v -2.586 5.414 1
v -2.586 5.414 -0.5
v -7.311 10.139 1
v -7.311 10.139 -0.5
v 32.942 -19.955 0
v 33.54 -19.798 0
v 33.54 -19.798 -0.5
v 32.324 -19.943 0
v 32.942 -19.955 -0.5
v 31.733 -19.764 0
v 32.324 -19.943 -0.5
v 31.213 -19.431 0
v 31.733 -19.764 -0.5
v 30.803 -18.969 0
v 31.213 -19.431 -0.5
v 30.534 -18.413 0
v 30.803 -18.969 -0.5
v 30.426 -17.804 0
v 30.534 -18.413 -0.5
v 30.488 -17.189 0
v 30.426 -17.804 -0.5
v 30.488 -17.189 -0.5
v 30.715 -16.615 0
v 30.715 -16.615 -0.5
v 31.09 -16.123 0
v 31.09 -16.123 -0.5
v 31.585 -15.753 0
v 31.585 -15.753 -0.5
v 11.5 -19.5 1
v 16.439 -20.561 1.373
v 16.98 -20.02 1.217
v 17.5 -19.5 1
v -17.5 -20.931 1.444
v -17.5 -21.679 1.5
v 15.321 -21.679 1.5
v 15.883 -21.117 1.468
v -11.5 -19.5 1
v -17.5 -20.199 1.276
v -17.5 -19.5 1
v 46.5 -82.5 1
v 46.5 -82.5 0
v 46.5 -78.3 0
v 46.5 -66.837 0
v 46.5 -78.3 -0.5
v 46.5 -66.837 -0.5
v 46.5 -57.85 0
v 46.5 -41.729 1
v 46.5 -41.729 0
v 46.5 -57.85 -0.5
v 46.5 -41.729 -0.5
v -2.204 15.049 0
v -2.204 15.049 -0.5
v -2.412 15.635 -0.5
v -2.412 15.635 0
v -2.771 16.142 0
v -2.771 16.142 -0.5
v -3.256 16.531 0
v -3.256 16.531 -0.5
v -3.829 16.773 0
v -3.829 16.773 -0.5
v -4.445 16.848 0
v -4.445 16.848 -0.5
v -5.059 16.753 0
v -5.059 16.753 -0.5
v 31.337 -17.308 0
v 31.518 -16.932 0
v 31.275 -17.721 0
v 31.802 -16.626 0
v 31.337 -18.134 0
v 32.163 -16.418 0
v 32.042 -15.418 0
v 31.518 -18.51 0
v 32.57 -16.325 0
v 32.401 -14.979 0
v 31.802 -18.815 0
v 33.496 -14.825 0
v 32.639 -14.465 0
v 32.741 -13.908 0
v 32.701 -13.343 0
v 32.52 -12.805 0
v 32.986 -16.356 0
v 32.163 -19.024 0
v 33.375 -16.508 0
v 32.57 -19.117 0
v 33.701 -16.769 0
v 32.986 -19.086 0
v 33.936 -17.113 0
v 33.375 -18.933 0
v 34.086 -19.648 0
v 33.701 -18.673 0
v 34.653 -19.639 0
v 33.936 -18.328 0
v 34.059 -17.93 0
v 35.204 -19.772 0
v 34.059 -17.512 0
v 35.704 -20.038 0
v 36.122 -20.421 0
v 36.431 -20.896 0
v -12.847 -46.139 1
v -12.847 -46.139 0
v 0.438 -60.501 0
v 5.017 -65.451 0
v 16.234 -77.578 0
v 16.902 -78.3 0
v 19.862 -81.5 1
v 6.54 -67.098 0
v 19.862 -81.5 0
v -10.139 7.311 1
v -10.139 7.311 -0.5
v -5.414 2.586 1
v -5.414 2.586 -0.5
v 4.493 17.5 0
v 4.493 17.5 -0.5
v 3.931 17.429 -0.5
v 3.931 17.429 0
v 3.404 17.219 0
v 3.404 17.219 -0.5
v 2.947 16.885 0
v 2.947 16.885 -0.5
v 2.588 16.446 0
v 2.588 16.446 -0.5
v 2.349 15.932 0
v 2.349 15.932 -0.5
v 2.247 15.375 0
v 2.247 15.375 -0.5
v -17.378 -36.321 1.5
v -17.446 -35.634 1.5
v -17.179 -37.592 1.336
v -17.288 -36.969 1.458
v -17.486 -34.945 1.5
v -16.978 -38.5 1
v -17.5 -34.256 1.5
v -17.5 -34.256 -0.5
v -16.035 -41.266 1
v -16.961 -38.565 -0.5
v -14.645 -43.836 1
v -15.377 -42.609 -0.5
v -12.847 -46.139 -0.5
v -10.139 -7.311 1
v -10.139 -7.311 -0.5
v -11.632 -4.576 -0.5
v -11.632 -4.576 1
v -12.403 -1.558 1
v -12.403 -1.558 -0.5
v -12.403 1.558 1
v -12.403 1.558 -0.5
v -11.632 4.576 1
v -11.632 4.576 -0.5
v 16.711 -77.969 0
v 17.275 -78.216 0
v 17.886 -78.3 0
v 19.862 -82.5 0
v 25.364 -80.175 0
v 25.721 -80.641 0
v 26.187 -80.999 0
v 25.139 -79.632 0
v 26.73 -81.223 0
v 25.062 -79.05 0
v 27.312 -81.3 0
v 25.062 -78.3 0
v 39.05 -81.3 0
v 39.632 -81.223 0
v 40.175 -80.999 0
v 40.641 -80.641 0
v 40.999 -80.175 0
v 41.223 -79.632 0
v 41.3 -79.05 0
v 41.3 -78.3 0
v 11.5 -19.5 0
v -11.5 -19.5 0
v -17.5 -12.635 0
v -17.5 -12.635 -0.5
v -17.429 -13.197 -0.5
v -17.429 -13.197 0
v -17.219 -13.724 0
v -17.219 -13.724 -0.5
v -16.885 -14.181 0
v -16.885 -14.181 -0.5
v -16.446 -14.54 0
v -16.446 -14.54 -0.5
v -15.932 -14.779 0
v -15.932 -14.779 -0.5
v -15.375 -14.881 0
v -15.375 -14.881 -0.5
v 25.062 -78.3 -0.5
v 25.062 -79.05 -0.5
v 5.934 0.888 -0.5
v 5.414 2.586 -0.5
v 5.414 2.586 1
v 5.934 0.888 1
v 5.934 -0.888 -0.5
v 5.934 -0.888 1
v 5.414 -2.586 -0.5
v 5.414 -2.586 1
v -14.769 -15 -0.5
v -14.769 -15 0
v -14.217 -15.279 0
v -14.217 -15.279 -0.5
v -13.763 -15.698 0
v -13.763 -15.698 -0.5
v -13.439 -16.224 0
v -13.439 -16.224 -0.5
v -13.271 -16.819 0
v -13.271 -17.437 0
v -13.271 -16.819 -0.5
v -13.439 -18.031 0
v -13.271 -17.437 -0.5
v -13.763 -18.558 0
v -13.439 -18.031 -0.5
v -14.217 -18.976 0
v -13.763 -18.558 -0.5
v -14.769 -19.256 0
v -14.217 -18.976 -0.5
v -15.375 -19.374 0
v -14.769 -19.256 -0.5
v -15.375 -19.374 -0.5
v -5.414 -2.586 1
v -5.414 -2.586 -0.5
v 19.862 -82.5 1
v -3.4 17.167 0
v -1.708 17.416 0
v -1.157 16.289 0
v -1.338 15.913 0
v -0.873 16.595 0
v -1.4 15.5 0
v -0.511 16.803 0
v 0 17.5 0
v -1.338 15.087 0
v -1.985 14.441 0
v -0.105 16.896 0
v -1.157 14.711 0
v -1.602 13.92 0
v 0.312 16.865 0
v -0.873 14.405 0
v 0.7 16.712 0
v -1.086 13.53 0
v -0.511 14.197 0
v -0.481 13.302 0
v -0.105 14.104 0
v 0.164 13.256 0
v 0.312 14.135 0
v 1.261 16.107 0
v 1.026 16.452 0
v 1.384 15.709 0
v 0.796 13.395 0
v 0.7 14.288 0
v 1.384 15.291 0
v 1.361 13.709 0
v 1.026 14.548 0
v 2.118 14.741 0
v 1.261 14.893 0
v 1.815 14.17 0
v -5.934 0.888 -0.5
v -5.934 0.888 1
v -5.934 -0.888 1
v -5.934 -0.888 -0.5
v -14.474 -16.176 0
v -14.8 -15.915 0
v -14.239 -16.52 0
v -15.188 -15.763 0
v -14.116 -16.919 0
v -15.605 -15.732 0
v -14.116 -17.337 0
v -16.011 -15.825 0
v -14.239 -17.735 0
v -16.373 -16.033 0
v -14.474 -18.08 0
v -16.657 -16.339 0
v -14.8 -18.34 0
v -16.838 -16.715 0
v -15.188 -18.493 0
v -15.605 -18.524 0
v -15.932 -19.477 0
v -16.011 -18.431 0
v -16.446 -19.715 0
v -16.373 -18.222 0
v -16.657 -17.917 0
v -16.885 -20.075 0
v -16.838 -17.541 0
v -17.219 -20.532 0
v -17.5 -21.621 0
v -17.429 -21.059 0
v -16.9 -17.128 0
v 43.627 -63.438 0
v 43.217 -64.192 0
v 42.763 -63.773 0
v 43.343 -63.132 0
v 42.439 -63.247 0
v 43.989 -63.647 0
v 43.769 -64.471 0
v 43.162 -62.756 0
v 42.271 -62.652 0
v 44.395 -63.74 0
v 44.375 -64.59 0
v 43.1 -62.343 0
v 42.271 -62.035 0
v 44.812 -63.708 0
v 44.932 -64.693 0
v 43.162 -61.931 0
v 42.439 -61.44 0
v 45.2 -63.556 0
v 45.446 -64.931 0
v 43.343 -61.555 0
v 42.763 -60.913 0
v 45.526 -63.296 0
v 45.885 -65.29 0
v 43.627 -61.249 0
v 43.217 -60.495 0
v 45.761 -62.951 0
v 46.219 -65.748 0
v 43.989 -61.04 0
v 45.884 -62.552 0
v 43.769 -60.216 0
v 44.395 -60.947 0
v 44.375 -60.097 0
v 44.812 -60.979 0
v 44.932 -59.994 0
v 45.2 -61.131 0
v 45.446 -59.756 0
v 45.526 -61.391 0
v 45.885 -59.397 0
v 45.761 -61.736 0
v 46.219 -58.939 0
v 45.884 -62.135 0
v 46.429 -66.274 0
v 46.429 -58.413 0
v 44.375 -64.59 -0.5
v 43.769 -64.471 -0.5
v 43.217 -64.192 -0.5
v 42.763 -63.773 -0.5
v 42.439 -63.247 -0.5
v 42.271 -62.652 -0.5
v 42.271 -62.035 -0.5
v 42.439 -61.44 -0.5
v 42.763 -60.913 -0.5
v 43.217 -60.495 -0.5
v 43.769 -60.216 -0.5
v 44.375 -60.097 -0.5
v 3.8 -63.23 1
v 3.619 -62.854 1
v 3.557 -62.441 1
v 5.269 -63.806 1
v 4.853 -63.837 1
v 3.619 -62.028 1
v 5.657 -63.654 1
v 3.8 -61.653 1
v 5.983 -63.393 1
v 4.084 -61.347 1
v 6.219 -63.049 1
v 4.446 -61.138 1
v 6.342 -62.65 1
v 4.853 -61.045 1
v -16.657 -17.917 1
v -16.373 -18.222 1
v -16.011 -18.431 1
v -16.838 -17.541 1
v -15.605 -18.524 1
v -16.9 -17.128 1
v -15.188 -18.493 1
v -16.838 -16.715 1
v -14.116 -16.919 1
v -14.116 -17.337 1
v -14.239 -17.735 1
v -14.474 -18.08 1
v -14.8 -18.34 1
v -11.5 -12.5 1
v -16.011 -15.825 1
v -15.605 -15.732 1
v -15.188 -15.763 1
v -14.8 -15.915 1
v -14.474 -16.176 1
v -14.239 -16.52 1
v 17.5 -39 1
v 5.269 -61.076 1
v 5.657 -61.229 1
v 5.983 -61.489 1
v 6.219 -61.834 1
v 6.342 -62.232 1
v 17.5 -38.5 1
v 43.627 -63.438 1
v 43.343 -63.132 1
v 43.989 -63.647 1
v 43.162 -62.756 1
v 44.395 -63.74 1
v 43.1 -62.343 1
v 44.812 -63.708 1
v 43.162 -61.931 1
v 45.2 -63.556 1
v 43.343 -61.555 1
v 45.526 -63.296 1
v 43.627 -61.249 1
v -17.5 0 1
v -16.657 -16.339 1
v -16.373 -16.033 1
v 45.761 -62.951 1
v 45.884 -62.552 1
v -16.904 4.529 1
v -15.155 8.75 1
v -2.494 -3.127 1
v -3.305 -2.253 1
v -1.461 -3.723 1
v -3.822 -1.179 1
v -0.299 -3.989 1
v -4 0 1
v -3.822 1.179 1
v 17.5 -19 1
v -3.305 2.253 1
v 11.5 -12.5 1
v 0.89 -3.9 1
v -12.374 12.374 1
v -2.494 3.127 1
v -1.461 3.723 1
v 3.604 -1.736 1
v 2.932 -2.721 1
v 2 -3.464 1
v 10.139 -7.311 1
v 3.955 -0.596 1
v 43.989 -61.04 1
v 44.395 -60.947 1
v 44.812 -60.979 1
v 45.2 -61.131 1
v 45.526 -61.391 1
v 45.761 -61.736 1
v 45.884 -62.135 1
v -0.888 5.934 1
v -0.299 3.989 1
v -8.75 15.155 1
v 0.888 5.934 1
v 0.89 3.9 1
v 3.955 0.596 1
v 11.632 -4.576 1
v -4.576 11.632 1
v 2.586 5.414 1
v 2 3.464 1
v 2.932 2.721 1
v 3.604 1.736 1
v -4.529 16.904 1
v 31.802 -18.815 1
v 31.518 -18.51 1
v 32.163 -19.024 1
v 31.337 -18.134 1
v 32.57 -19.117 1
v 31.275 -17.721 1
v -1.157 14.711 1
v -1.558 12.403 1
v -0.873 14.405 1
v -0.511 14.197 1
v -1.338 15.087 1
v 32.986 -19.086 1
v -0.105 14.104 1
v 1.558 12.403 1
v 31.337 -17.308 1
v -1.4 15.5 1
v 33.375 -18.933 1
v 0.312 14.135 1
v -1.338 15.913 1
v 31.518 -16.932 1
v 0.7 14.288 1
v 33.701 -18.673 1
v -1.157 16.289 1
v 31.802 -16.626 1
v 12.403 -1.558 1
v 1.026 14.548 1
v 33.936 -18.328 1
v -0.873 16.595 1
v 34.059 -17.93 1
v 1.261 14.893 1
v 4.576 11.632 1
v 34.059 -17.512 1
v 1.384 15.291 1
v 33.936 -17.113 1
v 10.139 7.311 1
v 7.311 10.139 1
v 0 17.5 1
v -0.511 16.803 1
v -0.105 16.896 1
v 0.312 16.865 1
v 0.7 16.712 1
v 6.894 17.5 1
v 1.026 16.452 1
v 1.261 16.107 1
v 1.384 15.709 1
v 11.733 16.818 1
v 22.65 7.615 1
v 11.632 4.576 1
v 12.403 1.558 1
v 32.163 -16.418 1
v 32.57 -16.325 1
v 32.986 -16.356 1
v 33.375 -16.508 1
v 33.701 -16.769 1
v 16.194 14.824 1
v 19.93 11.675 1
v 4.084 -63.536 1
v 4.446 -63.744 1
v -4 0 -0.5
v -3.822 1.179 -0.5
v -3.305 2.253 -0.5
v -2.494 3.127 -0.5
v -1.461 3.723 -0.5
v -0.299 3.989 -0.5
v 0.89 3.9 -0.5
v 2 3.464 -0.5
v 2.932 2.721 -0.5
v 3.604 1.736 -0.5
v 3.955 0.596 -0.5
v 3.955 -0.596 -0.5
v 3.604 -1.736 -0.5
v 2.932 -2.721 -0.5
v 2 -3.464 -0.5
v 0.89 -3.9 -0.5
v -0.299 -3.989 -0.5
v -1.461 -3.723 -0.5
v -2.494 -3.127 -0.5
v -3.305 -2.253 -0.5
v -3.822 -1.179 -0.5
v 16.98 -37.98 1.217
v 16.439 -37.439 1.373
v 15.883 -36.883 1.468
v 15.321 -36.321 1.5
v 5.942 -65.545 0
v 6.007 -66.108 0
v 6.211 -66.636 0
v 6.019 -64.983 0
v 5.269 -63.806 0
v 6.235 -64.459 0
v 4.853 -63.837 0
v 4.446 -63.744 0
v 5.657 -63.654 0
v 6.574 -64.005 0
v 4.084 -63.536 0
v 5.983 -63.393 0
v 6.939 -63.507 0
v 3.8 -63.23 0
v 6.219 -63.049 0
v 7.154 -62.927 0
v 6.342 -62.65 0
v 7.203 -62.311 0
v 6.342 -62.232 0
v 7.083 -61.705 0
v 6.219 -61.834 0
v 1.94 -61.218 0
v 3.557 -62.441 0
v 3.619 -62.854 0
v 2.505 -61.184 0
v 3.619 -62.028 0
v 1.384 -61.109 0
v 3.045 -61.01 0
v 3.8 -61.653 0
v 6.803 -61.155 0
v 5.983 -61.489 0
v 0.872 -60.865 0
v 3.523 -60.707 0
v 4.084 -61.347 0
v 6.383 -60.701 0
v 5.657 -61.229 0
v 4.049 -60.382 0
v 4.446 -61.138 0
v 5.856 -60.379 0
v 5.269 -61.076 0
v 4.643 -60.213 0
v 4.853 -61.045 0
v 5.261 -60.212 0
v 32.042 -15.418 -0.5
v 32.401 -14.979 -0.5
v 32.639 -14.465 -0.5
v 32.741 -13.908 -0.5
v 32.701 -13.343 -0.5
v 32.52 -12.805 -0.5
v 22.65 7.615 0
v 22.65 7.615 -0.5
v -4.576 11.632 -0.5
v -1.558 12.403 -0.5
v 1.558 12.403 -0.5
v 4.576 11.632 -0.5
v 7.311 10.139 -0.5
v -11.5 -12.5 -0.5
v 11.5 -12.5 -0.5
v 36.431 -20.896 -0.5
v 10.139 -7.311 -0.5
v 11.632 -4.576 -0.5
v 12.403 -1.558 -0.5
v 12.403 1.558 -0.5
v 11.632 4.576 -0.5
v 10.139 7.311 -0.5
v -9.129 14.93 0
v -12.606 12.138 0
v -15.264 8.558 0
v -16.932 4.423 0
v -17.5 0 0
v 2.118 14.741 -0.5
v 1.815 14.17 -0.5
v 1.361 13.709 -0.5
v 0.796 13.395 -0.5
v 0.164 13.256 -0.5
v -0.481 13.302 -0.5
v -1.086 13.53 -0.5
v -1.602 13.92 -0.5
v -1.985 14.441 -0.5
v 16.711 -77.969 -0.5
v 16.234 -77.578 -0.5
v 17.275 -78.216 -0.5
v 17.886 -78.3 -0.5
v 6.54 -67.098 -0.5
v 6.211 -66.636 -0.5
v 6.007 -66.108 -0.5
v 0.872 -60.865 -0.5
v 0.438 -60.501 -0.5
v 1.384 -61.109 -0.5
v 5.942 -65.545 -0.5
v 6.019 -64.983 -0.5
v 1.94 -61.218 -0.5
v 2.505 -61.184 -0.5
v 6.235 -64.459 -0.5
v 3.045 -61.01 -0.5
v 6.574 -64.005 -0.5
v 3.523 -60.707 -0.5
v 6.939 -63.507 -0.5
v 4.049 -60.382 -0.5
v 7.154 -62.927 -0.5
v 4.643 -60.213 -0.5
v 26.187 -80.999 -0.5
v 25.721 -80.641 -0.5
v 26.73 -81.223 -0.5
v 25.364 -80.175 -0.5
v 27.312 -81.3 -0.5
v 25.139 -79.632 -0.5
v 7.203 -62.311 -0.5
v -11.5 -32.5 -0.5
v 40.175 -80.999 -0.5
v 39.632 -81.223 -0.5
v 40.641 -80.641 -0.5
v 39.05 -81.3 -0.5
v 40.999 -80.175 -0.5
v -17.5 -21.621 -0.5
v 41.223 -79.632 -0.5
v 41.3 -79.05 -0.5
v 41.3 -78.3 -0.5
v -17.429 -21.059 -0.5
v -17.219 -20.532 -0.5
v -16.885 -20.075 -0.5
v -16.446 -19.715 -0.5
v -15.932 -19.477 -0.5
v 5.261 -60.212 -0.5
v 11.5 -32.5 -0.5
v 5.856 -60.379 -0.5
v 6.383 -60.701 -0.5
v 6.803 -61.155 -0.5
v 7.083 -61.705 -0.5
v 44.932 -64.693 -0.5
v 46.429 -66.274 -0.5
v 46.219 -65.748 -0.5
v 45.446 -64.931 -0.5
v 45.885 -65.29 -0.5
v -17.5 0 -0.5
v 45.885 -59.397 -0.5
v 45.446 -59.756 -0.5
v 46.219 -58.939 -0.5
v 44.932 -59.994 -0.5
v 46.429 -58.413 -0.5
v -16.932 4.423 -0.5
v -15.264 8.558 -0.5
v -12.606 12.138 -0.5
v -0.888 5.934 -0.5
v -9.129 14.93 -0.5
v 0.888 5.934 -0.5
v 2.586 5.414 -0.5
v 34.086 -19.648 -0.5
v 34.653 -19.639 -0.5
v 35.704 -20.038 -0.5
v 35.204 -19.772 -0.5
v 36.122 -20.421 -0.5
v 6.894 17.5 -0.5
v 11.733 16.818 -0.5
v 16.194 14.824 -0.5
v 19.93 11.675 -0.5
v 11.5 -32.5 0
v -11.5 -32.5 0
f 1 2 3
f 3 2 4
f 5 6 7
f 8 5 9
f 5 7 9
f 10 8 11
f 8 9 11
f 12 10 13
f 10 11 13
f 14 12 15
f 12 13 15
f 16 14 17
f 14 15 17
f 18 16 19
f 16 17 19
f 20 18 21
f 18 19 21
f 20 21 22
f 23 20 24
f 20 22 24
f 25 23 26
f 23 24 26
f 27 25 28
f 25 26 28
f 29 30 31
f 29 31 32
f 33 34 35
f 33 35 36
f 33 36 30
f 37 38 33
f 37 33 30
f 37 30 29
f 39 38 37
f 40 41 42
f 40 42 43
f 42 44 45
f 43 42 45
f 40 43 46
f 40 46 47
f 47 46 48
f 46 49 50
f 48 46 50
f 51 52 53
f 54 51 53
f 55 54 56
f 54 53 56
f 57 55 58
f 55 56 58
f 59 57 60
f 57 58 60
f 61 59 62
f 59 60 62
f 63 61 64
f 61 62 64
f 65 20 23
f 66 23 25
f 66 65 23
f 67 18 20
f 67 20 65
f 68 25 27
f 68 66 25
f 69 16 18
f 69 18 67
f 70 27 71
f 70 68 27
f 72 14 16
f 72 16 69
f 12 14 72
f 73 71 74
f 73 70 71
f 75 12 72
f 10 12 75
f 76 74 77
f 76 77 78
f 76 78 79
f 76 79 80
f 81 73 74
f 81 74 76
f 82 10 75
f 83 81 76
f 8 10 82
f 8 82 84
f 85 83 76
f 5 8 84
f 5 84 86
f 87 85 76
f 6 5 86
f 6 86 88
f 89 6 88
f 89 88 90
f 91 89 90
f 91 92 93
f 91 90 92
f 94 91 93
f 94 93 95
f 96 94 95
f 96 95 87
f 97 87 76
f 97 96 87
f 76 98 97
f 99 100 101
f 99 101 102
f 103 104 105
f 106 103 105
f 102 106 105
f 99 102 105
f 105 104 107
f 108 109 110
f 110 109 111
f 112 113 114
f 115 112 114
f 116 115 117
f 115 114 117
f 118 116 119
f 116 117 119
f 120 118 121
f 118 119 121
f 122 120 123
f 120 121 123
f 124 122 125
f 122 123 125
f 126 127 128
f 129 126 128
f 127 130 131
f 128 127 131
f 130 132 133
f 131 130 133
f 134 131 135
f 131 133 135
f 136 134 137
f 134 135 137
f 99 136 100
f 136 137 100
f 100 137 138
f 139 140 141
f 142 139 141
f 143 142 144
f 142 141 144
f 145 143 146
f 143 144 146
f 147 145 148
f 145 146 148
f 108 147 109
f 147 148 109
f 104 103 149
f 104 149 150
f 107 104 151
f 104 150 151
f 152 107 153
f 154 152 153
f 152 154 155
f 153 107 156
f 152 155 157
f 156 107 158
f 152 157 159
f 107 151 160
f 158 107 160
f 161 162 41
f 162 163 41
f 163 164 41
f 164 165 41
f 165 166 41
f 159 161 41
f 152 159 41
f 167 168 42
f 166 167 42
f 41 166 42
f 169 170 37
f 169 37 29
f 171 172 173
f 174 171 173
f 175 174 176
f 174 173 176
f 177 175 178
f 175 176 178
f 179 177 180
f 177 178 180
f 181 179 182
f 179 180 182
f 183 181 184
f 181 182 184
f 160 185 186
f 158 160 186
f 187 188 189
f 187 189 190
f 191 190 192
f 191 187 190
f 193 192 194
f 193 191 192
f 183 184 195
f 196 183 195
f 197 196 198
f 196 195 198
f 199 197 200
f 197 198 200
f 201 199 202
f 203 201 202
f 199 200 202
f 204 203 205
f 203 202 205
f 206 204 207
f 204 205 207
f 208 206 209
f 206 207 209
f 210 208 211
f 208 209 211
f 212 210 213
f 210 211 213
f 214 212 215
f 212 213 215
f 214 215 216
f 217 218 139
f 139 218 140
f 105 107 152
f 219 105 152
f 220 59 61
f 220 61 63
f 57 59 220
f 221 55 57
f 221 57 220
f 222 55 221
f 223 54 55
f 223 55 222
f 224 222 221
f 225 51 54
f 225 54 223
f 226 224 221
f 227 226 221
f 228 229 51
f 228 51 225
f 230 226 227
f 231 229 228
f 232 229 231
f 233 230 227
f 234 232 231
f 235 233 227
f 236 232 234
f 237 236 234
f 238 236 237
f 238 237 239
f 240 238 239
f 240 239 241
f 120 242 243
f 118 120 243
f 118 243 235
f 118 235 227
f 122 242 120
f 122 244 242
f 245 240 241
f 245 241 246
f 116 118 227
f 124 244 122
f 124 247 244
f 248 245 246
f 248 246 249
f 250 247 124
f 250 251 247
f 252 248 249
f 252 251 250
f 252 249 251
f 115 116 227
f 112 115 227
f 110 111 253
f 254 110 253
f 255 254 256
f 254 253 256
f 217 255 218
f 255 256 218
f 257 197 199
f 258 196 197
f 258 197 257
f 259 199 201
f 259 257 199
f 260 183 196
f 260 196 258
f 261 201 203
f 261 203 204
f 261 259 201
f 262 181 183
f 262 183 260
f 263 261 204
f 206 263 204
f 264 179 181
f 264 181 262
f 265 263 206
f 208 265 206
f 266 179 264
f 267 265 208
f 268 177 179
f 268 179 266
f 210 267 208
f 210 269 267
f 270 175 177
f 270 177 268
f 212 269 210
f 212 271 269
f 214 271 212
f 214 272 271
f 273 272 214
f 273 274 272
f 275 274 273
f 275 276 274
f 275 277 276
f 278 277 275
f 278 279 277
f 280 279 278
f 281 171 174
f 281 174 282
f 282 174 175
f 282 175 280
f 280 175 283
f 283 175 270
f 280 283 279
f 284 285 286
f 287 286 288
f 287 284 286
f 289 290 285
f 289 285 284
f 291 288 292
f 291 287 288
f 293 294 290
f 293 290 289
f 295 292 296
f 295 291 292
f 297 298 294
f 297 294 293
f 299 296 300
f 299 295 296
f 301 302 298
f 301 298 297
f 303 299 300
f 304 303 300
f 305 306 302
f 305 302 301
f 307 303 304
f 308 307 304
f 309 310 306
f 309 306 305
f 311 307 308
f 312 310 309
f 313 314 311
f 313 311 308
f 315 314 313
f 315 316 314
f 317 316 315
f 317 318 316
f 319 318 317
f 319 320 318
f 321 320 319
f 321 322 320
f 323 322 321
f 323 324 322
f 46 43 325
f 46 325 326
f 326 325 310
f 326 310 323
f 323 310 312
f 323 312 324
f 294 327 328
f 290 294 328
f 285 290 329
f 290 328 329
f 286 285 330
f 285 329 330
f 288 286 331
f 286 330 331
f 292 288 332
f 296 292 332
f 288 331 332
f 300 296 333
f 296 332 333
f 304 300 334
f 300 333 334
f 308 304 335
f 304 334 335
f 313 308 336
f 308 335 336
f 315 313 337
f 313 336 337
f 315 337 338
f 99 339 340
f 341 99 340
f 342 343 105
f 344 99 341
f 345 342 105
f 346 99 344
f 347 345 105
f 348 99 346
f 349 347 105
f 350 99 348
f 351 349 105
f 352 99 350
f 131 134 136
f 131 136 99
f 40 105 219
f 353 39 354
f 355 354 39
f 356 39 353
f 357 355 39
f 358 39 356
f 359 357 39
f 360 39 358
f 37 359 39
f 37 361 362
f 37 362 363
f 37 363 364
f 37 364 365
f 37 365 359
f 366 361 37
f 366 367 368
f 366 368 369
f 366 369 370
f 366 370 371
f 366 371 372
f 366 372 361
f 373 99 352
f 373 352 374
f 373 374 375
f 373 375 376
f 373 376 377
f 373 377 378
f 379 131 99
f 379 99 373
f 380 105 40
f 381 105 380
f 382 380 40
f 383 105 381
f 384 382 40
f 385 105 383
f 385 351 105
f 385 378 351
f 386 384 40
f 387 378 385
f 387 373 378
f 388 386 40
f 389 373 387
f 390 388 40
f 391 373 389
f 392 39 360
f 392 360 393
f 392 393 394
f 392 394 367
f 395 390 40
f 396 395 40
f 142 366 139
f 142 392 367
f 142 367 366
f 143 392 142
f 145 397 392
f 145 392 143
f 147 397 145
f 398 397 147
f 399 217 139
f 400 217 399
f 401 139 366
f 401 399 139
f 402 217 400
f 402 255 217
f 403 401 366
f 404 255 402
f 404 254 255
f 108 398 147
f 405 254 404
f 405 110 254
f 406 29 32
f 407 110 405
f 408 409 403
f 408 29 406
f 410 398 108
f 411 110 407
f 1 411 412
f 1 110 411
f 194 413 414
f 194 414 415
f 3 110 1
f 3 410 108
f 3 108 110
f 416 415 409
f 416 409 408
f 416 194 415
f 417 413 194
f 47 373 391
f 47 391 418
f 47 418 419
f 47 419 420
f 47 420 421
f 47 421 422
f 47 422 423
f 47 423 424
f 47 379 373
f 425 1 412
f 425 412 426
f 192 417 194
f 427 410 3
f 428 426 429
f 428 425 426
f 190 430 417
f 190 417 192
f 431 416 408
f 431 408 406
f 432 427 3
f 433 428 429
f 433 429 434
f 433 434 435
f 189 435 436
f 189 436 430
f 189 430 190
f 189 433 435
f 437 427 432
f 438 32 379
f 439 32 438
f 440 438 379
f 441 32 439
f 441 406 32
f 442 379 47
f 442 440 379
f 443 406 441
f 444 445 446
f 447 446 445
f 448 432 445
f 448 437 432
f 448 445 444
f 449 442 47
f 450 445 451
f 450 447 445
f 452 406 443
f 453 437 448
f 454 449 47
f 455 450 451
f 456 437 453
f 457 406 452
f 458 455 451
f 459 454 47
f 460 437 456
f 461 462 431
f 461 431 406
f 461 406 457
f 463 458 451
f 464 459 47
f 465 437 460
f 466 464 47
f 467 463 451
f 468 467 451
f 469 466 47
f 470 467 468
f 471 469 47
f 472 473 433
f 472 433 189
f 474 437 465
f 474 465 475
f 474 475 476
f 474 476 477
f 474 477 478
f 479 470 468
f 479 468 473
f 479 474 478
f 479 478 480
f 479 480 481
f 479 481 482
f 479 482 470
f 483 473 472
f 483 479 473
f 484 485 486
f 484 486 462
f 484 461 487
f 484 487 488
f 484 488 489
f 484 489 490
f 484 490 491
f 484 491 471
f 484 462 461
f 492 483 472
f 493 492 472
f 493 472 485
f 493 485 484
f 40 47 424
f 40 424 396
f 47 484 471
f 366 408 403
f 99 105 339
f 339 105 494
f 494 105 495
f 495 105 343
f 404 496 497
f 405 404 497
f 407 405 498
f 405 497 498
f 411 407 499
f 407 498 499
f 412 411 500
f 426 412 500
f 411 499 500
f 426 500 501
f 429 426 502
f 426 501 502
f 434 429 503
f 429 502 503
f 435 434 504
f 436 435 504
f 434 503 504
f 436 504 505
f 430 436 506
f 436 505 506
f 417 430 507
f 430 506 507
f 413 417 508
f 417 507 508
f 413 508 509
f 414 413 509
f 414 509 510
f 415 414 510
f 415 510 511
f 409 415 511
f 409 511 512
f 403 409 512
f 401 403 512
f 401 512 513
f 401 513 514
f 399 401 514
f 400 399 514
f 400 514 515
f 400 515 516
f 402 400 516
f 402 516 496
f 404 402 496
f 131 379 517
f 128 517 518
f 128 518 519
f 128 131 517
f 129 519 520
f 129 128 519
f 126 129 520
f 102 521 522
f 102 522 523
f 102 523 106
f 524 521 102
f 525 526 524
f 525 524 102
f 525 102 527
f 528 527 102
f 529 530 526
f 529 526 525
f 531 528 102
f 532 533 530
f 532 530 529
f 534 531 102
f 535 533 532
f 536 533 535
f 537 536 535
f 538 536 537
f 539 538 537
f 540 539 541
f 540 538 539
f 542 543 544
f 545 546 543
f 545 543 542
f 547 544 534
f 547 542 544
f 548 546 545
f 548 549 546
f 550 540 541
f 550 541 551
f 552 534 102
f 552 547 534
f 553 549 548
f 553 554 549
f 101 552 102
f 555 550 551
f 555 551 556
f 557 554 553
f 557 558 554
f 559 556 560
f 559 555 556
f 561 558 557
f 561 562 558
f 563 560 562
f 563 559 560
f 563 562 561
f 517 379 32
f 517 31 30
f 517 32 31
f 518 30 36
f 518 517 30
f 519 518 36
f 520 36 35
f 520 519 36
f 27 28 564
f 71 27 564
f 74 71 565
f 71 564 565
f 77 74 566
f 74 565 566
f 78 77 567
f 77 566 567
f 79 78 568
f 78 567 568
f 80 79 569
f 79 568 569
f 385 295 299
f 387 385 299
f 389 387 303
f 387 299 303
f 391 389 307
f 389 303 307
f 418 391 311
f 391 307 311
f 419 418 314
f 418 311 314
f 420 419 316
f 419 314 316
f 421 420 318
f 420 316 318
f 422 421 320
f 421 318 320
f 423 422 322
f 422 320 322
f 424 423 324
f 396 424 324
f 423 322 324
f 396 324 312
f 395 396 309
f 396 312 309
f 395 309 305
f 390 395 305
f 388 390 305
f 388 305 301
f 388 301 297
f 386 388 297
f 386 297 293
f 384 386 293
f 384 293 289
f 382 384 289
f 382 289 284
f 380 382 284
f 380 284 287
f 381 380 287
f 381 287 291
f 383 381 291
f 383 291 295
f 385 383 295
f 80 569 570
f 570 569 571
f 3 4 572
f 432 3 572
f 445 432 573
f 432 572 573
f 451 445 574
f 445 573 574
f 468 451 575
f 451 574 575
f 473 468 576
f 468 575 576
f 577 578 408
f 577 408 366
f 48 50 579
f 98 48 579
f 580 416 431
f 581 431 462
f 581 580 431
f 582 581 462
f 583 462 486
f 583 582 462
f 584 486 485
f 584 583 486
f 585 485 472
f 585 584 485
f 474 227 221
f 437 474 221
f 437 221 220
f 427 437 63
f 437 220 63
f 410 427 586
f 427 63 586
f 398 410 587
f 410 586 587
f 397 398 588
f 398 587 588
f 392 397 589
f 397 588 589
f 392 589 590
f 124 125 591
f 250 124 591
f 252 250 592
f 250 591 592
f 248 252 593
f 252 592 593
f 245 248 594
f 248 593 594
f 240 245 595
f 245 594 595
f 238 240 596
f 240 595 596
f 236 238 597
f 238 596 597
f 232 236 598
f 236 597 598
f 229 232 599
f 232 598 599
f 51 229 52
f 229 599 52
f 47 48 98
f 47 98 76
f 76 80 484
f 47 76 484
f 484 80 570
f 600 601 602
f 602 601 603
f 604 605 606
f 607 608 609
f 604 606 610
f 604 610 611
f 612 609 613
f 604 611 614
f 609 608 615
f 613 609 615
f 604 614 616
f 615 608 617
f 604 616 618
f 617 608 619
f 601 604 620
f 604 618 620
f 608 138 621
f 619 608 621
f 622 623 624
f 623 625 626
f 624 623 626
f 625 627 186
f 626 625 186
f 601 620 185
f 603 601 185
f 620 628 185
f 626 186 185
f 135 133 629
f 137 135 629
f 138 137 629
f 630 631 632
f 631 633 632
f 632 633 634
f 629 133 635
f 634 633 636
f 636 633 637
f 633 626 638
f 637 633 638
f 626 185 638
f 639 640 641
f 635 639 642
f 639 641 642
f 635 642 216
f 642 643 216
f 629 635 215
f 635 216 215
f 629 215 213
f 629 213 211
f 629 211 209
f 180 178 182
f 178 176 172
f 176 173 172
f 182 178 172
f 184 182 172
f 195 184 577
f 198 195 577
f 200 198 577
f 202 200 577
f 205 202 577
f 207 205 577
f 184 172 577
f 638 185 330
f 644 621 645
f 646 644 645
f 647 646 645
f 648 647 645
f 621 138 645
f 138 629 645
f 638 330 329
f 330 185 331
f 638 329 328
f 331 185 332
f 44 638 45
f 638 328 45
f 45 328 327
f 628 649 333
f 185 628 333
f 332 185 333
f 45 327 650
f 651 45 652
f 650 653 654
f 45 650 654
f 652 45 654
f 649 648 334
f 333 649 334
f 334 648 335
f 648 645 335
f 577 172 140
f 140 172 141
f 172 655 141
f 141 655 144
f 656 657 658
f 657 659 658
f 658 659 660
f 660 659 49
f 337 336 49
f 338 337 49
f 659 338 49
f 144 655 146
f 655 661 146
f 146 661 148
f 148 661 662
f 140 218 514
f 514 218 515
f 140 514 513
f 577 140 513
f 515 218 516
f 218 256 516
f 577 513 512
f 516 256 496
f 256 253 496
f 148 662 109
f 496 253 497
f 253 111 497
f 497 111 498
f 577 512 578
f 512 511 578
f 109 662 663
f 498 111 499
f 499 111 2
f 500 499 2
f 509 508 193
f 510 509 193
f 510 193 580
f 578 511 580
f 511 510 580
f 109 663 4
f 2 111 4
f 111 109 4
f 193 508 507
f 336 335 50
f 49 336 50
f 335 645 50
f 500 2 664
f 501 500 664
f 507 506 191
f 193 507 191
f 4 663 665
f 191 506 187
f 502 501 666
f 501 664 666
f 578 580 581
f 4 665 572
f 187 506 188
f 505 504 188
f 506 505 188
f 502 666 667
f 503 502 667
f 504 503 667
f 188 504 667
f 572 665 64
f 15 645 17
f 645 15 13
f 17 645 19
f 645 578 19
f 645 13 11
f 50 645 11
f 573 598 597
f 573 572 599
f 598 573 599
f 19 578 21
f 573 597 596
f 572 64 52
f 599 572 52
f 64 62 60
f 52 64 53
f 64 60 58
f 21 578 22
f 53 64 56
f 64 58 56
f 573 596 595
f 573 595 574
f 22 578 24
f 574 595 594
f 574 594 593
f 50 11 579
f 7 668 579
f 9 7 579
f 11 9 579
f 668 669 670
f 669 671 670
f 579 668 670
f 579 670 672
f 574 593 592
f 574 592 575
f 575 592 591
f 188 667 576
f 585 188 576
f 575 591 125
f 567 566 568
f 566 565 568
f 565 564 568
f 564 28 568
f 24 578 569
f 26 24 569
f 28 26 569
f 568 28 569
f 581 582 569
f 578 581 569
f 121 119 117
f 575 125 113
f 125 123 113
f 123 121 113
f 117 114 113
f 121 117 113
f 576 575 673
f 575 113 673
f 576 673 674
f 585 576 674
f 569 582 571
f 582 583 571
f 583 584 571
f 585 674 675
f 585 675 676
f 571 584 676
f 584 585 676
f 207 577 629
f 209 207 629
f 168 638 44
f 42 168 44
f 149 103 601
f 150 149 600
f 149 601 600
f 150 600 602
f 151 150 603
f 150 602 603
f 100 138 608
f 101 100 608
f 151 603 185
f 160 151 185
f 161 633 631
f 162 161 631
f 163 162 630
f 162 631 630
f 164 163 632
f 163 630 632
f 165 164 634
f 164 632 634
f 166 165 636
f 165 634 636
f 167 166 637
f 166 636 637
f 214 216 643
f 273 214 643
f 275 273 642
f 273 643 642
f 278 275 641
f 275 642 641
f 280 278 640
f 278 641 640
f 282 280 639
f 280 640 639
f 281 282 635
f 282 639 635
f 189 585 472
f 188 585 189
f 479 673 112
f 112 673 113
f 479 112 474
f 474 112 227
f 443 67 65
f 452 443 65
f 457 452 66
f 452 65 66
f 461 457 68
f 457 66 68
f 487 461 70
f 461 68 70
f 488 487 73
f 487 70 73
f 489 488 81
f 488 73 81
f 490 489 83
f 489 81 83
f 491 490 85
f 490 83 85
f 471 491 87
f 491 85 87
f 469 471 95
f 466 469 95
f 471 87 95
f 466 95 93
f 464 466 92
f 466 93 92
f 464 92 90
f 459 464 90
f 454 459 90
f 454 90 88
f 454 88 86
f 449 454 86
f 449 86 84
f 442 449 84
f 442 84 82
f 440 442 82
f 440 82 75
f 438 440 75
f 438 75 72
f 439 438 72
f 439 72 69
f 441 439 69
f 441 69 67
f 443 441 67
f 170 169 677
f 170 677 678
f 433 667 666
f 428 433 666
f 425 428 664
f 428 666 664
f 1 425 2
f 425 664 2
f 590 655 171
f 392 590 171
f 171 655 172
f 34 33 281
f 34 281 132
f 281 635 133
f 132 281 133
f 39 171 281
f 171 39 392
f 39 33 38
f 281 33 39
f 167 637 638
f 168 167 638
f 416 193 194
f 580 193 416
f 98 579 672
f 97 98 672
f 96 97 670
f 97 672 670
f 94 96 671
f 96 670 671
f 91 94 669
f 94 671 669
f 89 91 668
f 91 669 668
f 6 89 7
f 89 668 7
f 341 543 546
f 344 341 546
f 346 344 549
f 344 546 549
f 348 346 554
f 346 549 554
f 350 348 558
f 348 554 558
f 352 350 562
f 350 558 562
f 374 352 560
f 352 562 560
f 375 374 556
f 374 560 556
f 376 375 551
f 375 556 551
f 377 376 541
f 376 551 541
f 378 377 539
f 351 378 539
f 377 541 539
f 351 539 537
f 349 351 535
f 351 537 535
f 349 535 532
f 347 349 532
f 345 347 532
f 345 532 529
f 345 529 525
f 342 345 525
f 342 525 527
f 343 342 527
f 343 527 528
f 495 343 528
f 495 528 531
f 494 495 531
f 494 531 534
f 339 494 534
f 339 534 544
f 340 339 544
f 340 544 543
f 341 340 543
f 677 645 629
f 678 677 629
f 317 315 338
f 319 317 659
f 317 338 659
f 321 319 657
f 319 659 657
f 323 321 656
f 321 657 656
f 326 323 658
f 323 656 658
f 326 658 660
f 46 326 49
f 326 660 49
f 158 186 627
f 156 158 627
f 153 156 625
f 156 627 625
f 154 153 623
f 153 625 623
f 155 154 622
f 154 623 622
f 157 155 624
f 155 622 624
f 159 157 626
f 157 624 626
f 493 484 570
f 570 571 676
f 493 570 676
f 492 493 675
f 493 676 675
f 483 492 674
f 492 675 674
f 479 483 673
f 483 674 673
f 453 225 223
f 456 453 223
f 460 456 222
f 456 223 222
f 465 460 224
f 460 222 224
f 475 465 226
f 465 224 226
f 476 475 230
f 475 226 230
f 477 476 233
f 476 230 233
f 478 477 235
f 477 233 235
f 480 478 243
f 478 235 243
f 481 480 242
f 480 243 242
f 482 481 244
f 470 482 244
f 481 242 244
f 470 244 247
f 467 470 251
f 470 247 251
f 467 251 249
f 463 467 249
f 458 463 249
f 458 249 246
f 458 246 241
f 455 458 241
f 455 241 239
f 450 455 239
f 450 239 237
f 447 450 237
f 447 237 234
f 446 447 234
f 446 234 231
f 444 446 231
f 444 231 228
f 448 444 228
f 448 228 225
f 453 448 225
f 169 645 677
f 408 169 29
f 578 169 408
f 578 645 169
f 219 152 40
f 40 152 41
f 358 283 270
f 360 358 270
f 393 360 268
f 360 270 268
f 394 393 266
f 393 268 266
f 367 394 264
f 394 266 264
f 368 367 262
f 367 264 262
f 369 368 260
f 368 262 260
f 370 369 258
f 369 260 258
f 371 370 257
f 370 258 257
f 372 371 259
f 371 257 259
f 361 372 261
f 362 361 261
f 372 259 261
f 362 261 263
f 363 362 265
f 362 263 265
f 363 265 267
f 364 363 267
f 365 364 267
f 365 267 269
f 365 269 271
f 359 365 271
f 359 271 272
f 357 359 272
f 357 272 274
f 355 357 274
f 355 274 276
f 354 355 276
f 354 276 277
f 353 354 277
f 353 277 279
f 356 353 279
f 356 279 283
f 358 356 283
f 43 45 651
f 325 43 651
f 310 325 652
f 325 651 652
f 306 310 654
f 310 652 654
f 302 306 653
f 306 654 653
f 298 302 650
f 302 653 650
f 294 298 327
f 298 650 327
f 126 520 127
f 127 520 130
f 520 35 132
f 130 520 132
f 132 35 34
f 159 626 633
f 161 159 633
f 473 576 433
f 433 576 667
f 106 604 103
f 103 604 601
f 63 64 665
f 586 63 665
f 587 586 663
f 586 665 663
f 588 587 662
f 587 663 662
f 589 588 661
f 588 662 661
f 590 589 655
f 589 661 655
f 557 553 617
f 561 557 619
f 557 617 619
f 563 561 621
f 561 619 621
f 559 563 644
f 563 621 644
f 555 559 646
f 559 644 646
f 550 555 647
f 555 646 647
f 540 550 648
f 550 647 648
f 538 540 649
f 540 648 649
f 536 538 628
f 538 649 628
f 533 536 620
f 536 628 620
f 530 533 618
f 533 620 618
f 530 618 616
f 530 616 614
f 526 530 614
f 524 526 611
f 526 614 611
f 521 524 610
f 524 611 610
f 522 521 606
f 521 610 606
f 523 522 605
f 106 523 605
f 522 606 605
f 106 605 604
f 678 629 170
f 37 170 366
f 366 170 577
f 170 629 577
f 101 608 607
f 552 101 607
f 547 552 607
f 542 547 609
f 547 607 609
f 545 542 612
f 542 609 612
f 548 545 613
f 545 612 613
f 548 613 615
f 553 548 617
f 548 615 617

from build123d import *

# Parameters (mm, degrees)
EXTRUDE_1_DEPTH     = 1
EXTRUDE_START       = 0.5
EXTRUDE_2_DEPTH     = 0.5
FILLET_1_R          = 2.25
CUT_EXTRUDE_1_REACH = 96.707
SKETCH_3_R          = 1.4
CUT_EXTRUDE_2_REACH = 96.714
SKETCH_4_R          = 4
SKETCH_4_W          = 23
SKETCH_4_H          = 20
EXTRUDE_3_DEPTH     = 1.5
FILLET_START        = -18
FILLET_2_DEPTH      = 35.5
FILLET_START_2      = -39
FILLET_2_2_DEPTH    = 20


with BuildPart() as part:
    # 스케치1 → 보스-돌출1 (new body)
    with BuildSketch(Plane.XY):
        with BuildLine():
            Line((46.5, -82.5), (46.5, -41.72899408))
            Line((46.5, -41.72899408), (22.650184607, 7.615451559))
            ThreePointArc((22.650184607, 7.615451559), (16.194067118, 14.824311152), (6.894077933, 17.5))
            Line((6.894077933, 17.5), (0, 17.5))
            ThreePointArc((0, 17.5), (-12.374368671, 12.374368671), (-17.5, 0))
            Line((-17.5, 0), (-17.5, -34.255734548))
            ThreePointArc((-17.5, -34.255734548), (-16.295213306, -40.636645401), (-12.846740193, -46.138969227))
            Line((-12.846740193, -46.138969227), (19.862213273, -81.5))
            Line((19.862213273, -81.5), (19.862213273, -82.5))
            Line((19.862213273, -82.5), (46.5, -82.5))
        make_face()
    extrude(amount=EXTRUDE_1_DEPTH)

    # 스케치2 → 보스-돌출2 (add)
    with BuildSketch(Plane(origin=(0, 0, 0), x_dir=(-1, 0, 0), z_dir=(0, 0, -1)).offset(EXTRUDE_START)):
        with BuildLine():
            Line((-41.3, -81.3), (-41.3, -78.3))
            Line((-41.3, -78.3), (-46.5, -78.3))
            Line((-46.5, -78.3), (-46.5, -64.59349112))
            Line((-46.5, -64.59349112), (-44.5, -64.59349112))
            ThreePointArc((-44.5, -64.59349112), (-42.25, -62.34349112), (-44.5, -60.09349112))
            Line((-44.5, -60.09349112), (-46.5, -60.09349112))
            Line((-46.5, -60.09349112), (-46.5, -41.72899408))
            Line((-46.5, -41.72899408), (-35.454570743, -18.876381824))
            Line((-35.454570743, -18.876381824), (-33.653872837, -19.746719145))
            ThreePointArc((-33.653872837, -19.746719145), (-30.648958207, -18.700063487), (-31.695613865, -15.695148857))
            Line((-31.695613865, -15.695148857), (-33.49631177, -14.824811536))
            Line((-33.49631177, -14.824811536), (-22.650184607, 7.615451559))
            ThreePointArc((-22.650184607, 7.615451559), (-16.194067118, 14.824311152), (-6.894077933, 17.5))
            Line((-6.894077933, 17.5), (-2.25, 17.5))
            Line((-2.25, 17.5), (-2.25, 15.5))
            ThreePointArc((-2.25, 15.5), (0, 13.25), (2.25, 15.5))
            Line((2.25, 15.5), (2.25, 17.354754392))
            ThreePointArc((2.25, 17.354754392), (13.145816825, 11.551515052), (17.5, 0))
            Line((17.5, 0), (17.5, -14.877867274))
            Line((17.5, -14.877867274), (15.5, -14.877867274))
            ThreePointArc((15.5, -14.877867274), (13.25, -17.127867274), (15.5, -19.377867274))
            Line((15.5, -19.377867274), (17.5, -19.377867274))
            Line((17.5, -19.377867274), (17.5, -34.255734548))
            ThreePointArc((17.5, -34.255734548), (16.295213306, -40.636645401), (12.846740193, -46.138969227))
            Line((12.846740193, -46.138969227), (-1.961163732, -62.14751401))
            Line((-1.961163732, -62.14751401), (-3.429362611, -60.789430047))
            ThreePointArc((-3.429362611, -60.789430047), (-6.608930809, -60.913309328), (-6.485051529, -64.092877525))
            Line((-6.485051529, -64.092877525), (-5.016852649, -65.450961488))
            Line((-5.016852649, -65.450961488), (-16.902213273, -78.3))
            Line((-16.902213273, -78.3), (-25.062213273, -78.3))
            Line((-25.062213273, -78.3), (-25.062213273, -81.3))
            Line((-25.062213273, -81.3), (-41.3, -81.3))
        make_face()
    extrude(amount=-EXTRUDE_2_DEPTH)

    # 필렛1
    # the kernel refuses this fillet: 2.25 mm, written as the material it takes off along each edge
    with BuildSketch(Plane(origin=(16.902213273, -78.3, -2.959324658), x_dir=(1, 0, 0), z_dir=(0, 0, 1))) as fillet_1_piece_1:
        with BuildLine():
            CenterArc((FILLET_1_R * 0.437213272583, FILLET_1_R), FILLET_1_R, 222.768825392, 47.231174608)
            Line((-FILLET_1_R * 0.296886167004, FILLET_1_R * 0.320958018383), (0, 0))
            Line((0, 0), (FILLET_1_R * 0.437213272583, 0))
        make_face()
    extrude(amount=2.959324658, mode=Mode.SUBTRACT)
    with BuildSketch(Plane(origin=(41.3, -81.3, -6.125), x_dir=(0, 1, 0), z_dir=(0, 0, 1)), Plane(origin=(25.062213273, -81.3, -6.125), x_dir=(1, 0, 0), z_dir=(0, 0, 1))) as fillet_1_piece_2:
        with BuildLine():
            CenterArc((FILLET_1_R, FILLET_1_R), FILLET_1_R, 180, 90)
            Line((0, FILLET_1_R), (0, 0))
            Line((0, 0), (FILLET_1_R, 0))
        make_face()
    extrude(amount=6.125, mode=Mode.SUBTRACT)
    with BuildSketch(Plane(origin=(-17.5, -14.877867274, -6.107625472), x_dir=(0, 1, 0), z_dir=(0, 0, 1)), Plane(origin=(46.5, -64.59349112, -6.107625472), x_dir=(0, -1, 0), z_dir=(0, 0, 1)), Plane(origin=(1.961163732, -62.14751401, -6.107625472), x_dir=(-0.679041981617428, 0.7340994395864068, 0), z_dir=(0, 0, 1))) as fillet_1_piece_3:
        with BuildLine():
            CenterArc((2.243050189, -2.25), FILLET_1_R, 90, 86.815261463)
            Line((-0.003474906, -2.125), (-0.228127415, -2.1125))
            ThreePointArc((-0.228127415, -2.1125), (-0.225, -2), (-0.225, 0))
            Line((-0.225, 0), (0, 0.225))
            Line((0, 0.225), (2.243050189, 0.225))
            Line((2.243050189, 0.225), (2.243050189, 0))
        make_face()
    extrude(amount=6.107625472, mode=Mode.SUBTRACT)
    with BuildSketch(Plane(origin=(-17.5, -19.377867274, -6.107625472), x_dir=(0, -1, 0), z_dir=(0, 0, 1)), Plane(origin=(46.5, -60.09349112, -6.107625472), x_dir=(0, 1, 0), z_dir=(0, 0, 1)), Plane(origin=(5.016852649, -65.450961488, -6.107625472), x_dir=(0.6790419816174277, -0.7340994395864073, 0), z_dir=(0, 0, 1))) as fillet_1_piece_4:
        with BuildLine():
            CenterArc((2.243050189, 2.25), FILLET_1_R, 183.184738537, 86.815261463)
            Line((-0.003474906, 2.125), (-0.228127415, 2.1125))
            ThreePointArc((-0.228127415, 2.1125), (-0.225, 2), (-0.225, 0))
            Line((-0.225, 0), (0, -0.225))
            Line((0, -0.225), (2.243050189, -0.225))
            Line((2.243050189, -0.225), (2.243050189, 0))
        make_face()
    extrude(amount=6.107625472, mode=Mode.SUBTRACT)
    with BuildSketch(Plane(origin=(2.25, 17.5, -6.107625472), x_dir=(-0.0016352474835574222, -0.99999866298194, 0), z_dir=(0, 0, 1)), Plane(origin=(35.454570743, -18.876381824, -6.107625472), x_dir=(-0.901059357516204, -0.4336957853524583, 0), z_dir=(0, 0, 1))) as fillet_1_piece_5:
        with BuildLine():
            CenterArc((2.24632905, 2.246726497), FILLET_1_R, 180.093692821, 86.815261463)
            Line((-0.003667942, 2.24304719), (-0.228667641, 2.242679259))
            Line((-0.228667641, 2.242679259), (-0.224999699, -0.000367931))
            Line((-0.224999699, -0.000367931), (0.000367931, -0.224999699))
            ThreePointArc((0.000367931, -0.224999699), (2.000365257, -0.221729204), (2.11287022, -0.22467265))
            Line((2.11287022, -0.22467265), (2.125002841, 0))
        make_face()
    extrude(amount=6.107625472, mode=Mode.SUBTRACT)
    with BuildSketch(Plane(origin=(-2.25, 17.354754392, -7.682759743), x_dir=(-0.9777990320246813, -0.2095448710219276, 0), z_dir=(0, 0, 1))) as fillet_1_piece_6:
        with BuildLine():
            CenterArc((2.688404361, 2.242406315), FILLET_1_R, 179.456997301, 95.251636128)
            Line((0.438505404, 2.263729662), (0.213515509, 2.265861997))
            ThreePointArc((0.213515509, 2.265861997), (0.168649488, 1.860724645), (-0.220004782, 0.047147596))
            Line((-0.220004782, 0.047147596), (-0.018469954, -0.224240631))
            ThreePointArc((-0.018469954, -0.224240631), (1.436551949, -0.284061995), (2.891573851, -0.224240631))
            Line((2.891573851, -0.224240631), (2.873103897, 0))
        make_face()
    extrude(amount=7.682759743, mode=Mode.SUBTRACT)
    with BuildSketch(Plane(origin=(33.49631177, -14.824811536, -6.107625472), x_dir=(-0.8996361406020625, -0.43664037207137185, 0), z_dir=(0, 0, 1))) as fillet_1_piece_7:
        with BuildLine():
            CenterArc((2.24632905, -2.246726497), FILLET_1_R, 93.091045716, 86.815261463)
            Line((-0.003667942, -2.24304719), (-0.228667641, -2.242679259))
            Line((-0.228667641, -2.242679259), (-0.224999699, 0.000367931))
            Line((-0.224999699, 0.000367931), (0.000367931, 0.224999699))
            ThreePointArc((0.000367931, 0.224999699), (2.000365257, 0.221729204), (2.11287022, 0.22467265))
            Line((2.11287022, 0.22467265), (2.125002841, 0))
        make_face()
    extrude(amount=6.107625472, mode=Mode.SUBTRACT)

    # 스케치3 → 컷-돌출1 (cut, up to next)
    with BuildSketch(Plane(origin=(0, 0, 0), x_dir=(-1, 0, 0), z_dir=(0, 0, -1)), mode=Mode.PRIVATE) as cut_extrude_1_sk1:
        with Locations((0, 15.5)):
            Circle(SKETCH_3_R)
    cut_extrude_1_tool1 = extrude(cut_extrude_1_sk1.sketch, amount=-CUT_EXTRUDE_1_REACH, mode=Mode.PRIVATE) & part.part
    # 스케치3 → 컷-돌출1 (cut, up to next)
    with BuildSketch(Plane(origin=(0, 0, 0), x_dir=(-1, 0, 0), z_dir=(0, 0, -1)), mode=Mode.PRIVATE) as cut_extrude_1_sk2:
        with Locations((15.5, -17.127867274)):
            Circle(SKETCH_3_R)
    cut_extrude_1_tool2 = extrude(cut_extrude_1_sk2.sketch, amount=-CUT_EXTRUDE_1_REACH, mode=Mode.PRIVATE) & part.part
    # 스케치3 → 컷-돌출1 (cut, up to next)
    with BuildSketch(Plane(origin=(0, 0, 0), x_dir=(-1, 0, 0), z_dir=(0, 0, -1)), mode=Mode.PRIVATE) as cut_extrude_1_sk3:
        with Locations((-32.674743351, -17.720934001)):
            Circle(SKETCH_3_R)
    cut_extrude_1_tool3 = extrude(cut_extrude_1_sk3.sketch, amount=-CUT_EXTRUDE_1_REACH, mode=Mode.PRIVATE) & part.part
    # 스케치3 → 컷-돌출1 (cut, up to next)
    with BuildSketch(Plane(origin=(0, 0, 0), x_dir=(-1, 0, 0), z_dir=(0, 0, -1)), mode=Mode.PRIVATE) as cut_extrude_1_sk4:
        with Locations((-44.5, -62.34349112)):
            Circle(SKETCH_3_R)
    cut_extrude_1_tool4 = extrude(cut_extrude_1_sk4.sketch, amount=-CUT_EXTRUDE_1_REACH, mode=Mode.PRIVATE) & part.part
    # 스케치3 → 컷-돌출1 (cut, up to next)
    with BuildSketch(Plane(origin=(0, 0, 0), x_dir=(-1, 0, 0), z_dir=(0, 0, -1)), mode=Mode.PRIVATE) as cut_extrude_1_sk5:
        with Locations((-4.95720707, -62.441153786)):
            Circle(SKETCH_3_R)
    cut_extrude_1_tool5 = extrude(cut_extrude_1_sk5.sketch, amount=-CUT_EXTRUDE_1_REACH, mode=Mode.PRIVATE) & part.part
    add(cut_extrude_1_tool1.solids().sort_by_distance((0, 15.5, 0))[0], mode=Mode.SUBTRACT)
    add(cut_extrude_1_tool2.solids().sort_by_distance((-15.5, -17.127867, 0))[0], mode=Mode.SUBTRACT)
    add(cut_extrude_1_tool3.solids().sort_by_distance((32.674743, -17.720934, 0))[0], mode=Mode.SUBTRACT)
    add(cut_extrude_1_tool4.solids().sort_by_distance((44.5, -62.343491, 0))[0], mode=Mode.SUBTRACT)
    add(cut_extrude_1_tool5.solids().sort_by_distance((4.957207, -62.441154, 0))[0], mode=Mode.SUBTRACT)

    # 스케치4 → 컷-돌출2 (cut, up to next)
    with BuildSketch(Plane(origin=(0, 0, -0.5), x_dir=(-1, 0, 0), z_dir=(0, 0, -1)), mode=Mode.PRIVATE) as cut_extrude_2_sk1:
        Circle(SKETCH_4_R)
    cut_extrude_2_tool1 = extrude(cut_extrude_2_sk1.sketch, amount=-CUT_EXTRUDE_2_REACH, mode=Mode.PRIVATE) & part.part
    # 스케치4 → 컷-돌출2 (cut, up to next)
    with BuildSketch(Plane(origin=(0, 0, -0.5), x_dir=(-1, 0, 0), z_dir=(0, 0, -1)), mode=Mode.PRIVATE) as cut_extrude_2_sk2:
        with Locations((0, -22.5)):
            Rectangle(SKETCH_4_W, SKETCH_4_H)
    cut_extrude_2_tool2 = extrude(cut_extrude_2_sk2.sketch, amount=-CUT_EXTRUDE_2_REACH, mode=Mode.PRIVATE) & part.part
    # 스케치4 → 컷-돌출2 (cut, up to next)
    with BuildSketch(Plane(origin=(0, 0, -0.5), x_dir=(-1, 0, 0), z_dir=(0, 0, -1)), mode=Mode.PRIVATE) as cut_extrude_2_sk3:
        with BuildLine():
            Line((-5.414213562, -2.585786438), (-10.139177746, -7.310750621))
            ThreePointArc((-10.139177746, -7.310750621), (-12.5, 0), (-10.139177746, 7.310750621))
            Line((-10.139177746, 7.310750621), (-5.414213562, 2.585786438))
            ThreePointArc((-5.414213562, 2.585786438), (-6, 0), (-5.414213562, -2.585786438))
        make_face()
    cut_extrude_2_tool3 = extrude(cut_extrude_2_sk3.sketch, amount=-CUT_EXTRUDE_2_REACH, mode=Mode.PRIVATE) & part.part
    # 스케치4 → 컷-돌출2 (cut, up to next)
    with BuildSketch(Plane(origin=(0, 0, -0.5), x_dir=(-1, 0, 0), z_dir=(0, 0, -1)), mode=Mode.PRIVATE) as cut_extrude_2_sk4:
        with BuildLine():
            Line((5.414213562, -2.585786438), (10.139177746, -7.310750621))
            ThreePointArc((10.139177746, -7.310750621), (12.5, 0), (10.139177746, 7.310750621))
            Line((10.139177746, 7.310750621), (5.414213562, 2.585786438))
            ThreePointArc((5.414213562, 2.585786438), (6, 0), (5.414213562, -2.585786438))
        make_face()
    cut_extrude_2_tool4 = extrude(cut_extrude_2_sk4.sketch, amount=-CUT_EXTRUDE_2_REACH, mode=Mode.PRIVATE) & part.part
    # 스케치4 → 컷-돌출2 (cut, up to next)
    with BuildSketch(Plane(origin=(0, 0, -0.5), x_dir=(-1, 0, 0), z_dir=(0, 0, -1)), mode=Mode.PRIVATE) as cut_extrude_2_sk5:
        with BuildLine():
            Line((2.585786438, 5.414213562), (7.310750621, 10.139177746))
            ThreePointArc((7.310750621, 10.139177746), (0, 12.5), (-7.310750621, 10.139177746))
            Line((-7.310750621, 10.139177746), (-2.585786438, 5.414213562))
            ThreePointArc((-2.585786438, 5.414213562), (0, 6), (2.585786438, 5.414213562))
        make_face()
    cut_extrude_2_tool5 = extrude(cut_extrude_2_sk5.sketch, amount=-CUT_EXTRUDE_2_REACH, mode=Mode.PRIVATE) & part.part
    add(cut_extrude_2_tool1.solids().sort_by_distance((0, 0, -0.5))[0], mode=Mode.SUBTRACT)
    add(cut_extrude_2_tool2.solids().sort_by_distance((0, -22.5, -0.5))[0], mode=Mode.SUBTRACT)
    add(cut_extrude_2_tool3.solids().sort_by_distance((9.239512, 0, -0.5))[0], mode=Mode.SUBTRACT)
    add(cut_extrude_2_tool4.solids().sort_by_distance((-9.239512, 0, -0.5))[0], mode=Mode.SUBTRACT)
    add(cut_extrude_2_tool5.solids().sort_by_distance((0, 9.239512, -0.5))[0], mode=Mode.SUBTRACT)

    # 스케치6 → 보스-돌출3 (add)
    with BuildSketch(Plane(origin=(0, 0, 0), x_dir=(-1, 0, 0), z_dir=(0, 0, -1))):
        with BuildLine():
            Line((17.5, -19.5), (-17.5, -19.5))
            Line((-17.5, -19.5), (-17.5, -38.5))
            Line((-17.5, -38.5), (16.977520749, -38.5))
            ThreePointArc((16.977520749, -38.5), (17.368889042, -36.393886425), (17.5, -34.255734548))
            Line((17.5, -34.255734548), (17.5, -19.5))
        make_face()
    extrude(amount=-EXTRUDE_3_DEPTH)

    # 필렛2: read off the stored shape, not the designer's step
    # 필렛2 outline → 필렛2 (cut)
    with BuildSketch(Plane.YZ.offset(FILLET_START)):
        with BuildLine():
            Line((-38.5, 1.5), (-38.5, 1))
            ThreePointArc((-38.5, 1), (-37.438584517, 1.373397172), (-36.320550528, 1.5))
            Line((-36.320550528, 1.5), (-38.5, 1.5))
        make_face()
        with BuildLine():
            Line((-19.5, 1.5), (-21.679449472, 1.5))
            ThreePointArc((-21.679449472, 1.5), (-20.561415483, 1.373397172), (-19.5, 1))
            Line((-19.5, 1), (-19.5, 1.5))
        make_face()
    extrude(amount=FILLET_2_DEPTH, mode=Mode.SUBTRACT)

    # Fillet 2 2 outline → Fillet 2 2 (cut)
    with BuildSketch(Plane(origin=(0, 0, 0), x_dir=(1, 0, 0), z_dir=(0, 1, 0)).offset(FILLET_START_2)):
        with BuildLine():
            Line((17.5, -1.5), (17.5, -1))
            ThreePointArc((17.5, -1), (16.438584517, -1.373397172), (15.320550528, -1.5))
            Line((15.320550528, -1.5), (17.5, -1.5))
        make_face()
    extrude(amount=FILLET_2_2_DEPTH, mode=Mode.SUBTRACT)


solid = part.part
